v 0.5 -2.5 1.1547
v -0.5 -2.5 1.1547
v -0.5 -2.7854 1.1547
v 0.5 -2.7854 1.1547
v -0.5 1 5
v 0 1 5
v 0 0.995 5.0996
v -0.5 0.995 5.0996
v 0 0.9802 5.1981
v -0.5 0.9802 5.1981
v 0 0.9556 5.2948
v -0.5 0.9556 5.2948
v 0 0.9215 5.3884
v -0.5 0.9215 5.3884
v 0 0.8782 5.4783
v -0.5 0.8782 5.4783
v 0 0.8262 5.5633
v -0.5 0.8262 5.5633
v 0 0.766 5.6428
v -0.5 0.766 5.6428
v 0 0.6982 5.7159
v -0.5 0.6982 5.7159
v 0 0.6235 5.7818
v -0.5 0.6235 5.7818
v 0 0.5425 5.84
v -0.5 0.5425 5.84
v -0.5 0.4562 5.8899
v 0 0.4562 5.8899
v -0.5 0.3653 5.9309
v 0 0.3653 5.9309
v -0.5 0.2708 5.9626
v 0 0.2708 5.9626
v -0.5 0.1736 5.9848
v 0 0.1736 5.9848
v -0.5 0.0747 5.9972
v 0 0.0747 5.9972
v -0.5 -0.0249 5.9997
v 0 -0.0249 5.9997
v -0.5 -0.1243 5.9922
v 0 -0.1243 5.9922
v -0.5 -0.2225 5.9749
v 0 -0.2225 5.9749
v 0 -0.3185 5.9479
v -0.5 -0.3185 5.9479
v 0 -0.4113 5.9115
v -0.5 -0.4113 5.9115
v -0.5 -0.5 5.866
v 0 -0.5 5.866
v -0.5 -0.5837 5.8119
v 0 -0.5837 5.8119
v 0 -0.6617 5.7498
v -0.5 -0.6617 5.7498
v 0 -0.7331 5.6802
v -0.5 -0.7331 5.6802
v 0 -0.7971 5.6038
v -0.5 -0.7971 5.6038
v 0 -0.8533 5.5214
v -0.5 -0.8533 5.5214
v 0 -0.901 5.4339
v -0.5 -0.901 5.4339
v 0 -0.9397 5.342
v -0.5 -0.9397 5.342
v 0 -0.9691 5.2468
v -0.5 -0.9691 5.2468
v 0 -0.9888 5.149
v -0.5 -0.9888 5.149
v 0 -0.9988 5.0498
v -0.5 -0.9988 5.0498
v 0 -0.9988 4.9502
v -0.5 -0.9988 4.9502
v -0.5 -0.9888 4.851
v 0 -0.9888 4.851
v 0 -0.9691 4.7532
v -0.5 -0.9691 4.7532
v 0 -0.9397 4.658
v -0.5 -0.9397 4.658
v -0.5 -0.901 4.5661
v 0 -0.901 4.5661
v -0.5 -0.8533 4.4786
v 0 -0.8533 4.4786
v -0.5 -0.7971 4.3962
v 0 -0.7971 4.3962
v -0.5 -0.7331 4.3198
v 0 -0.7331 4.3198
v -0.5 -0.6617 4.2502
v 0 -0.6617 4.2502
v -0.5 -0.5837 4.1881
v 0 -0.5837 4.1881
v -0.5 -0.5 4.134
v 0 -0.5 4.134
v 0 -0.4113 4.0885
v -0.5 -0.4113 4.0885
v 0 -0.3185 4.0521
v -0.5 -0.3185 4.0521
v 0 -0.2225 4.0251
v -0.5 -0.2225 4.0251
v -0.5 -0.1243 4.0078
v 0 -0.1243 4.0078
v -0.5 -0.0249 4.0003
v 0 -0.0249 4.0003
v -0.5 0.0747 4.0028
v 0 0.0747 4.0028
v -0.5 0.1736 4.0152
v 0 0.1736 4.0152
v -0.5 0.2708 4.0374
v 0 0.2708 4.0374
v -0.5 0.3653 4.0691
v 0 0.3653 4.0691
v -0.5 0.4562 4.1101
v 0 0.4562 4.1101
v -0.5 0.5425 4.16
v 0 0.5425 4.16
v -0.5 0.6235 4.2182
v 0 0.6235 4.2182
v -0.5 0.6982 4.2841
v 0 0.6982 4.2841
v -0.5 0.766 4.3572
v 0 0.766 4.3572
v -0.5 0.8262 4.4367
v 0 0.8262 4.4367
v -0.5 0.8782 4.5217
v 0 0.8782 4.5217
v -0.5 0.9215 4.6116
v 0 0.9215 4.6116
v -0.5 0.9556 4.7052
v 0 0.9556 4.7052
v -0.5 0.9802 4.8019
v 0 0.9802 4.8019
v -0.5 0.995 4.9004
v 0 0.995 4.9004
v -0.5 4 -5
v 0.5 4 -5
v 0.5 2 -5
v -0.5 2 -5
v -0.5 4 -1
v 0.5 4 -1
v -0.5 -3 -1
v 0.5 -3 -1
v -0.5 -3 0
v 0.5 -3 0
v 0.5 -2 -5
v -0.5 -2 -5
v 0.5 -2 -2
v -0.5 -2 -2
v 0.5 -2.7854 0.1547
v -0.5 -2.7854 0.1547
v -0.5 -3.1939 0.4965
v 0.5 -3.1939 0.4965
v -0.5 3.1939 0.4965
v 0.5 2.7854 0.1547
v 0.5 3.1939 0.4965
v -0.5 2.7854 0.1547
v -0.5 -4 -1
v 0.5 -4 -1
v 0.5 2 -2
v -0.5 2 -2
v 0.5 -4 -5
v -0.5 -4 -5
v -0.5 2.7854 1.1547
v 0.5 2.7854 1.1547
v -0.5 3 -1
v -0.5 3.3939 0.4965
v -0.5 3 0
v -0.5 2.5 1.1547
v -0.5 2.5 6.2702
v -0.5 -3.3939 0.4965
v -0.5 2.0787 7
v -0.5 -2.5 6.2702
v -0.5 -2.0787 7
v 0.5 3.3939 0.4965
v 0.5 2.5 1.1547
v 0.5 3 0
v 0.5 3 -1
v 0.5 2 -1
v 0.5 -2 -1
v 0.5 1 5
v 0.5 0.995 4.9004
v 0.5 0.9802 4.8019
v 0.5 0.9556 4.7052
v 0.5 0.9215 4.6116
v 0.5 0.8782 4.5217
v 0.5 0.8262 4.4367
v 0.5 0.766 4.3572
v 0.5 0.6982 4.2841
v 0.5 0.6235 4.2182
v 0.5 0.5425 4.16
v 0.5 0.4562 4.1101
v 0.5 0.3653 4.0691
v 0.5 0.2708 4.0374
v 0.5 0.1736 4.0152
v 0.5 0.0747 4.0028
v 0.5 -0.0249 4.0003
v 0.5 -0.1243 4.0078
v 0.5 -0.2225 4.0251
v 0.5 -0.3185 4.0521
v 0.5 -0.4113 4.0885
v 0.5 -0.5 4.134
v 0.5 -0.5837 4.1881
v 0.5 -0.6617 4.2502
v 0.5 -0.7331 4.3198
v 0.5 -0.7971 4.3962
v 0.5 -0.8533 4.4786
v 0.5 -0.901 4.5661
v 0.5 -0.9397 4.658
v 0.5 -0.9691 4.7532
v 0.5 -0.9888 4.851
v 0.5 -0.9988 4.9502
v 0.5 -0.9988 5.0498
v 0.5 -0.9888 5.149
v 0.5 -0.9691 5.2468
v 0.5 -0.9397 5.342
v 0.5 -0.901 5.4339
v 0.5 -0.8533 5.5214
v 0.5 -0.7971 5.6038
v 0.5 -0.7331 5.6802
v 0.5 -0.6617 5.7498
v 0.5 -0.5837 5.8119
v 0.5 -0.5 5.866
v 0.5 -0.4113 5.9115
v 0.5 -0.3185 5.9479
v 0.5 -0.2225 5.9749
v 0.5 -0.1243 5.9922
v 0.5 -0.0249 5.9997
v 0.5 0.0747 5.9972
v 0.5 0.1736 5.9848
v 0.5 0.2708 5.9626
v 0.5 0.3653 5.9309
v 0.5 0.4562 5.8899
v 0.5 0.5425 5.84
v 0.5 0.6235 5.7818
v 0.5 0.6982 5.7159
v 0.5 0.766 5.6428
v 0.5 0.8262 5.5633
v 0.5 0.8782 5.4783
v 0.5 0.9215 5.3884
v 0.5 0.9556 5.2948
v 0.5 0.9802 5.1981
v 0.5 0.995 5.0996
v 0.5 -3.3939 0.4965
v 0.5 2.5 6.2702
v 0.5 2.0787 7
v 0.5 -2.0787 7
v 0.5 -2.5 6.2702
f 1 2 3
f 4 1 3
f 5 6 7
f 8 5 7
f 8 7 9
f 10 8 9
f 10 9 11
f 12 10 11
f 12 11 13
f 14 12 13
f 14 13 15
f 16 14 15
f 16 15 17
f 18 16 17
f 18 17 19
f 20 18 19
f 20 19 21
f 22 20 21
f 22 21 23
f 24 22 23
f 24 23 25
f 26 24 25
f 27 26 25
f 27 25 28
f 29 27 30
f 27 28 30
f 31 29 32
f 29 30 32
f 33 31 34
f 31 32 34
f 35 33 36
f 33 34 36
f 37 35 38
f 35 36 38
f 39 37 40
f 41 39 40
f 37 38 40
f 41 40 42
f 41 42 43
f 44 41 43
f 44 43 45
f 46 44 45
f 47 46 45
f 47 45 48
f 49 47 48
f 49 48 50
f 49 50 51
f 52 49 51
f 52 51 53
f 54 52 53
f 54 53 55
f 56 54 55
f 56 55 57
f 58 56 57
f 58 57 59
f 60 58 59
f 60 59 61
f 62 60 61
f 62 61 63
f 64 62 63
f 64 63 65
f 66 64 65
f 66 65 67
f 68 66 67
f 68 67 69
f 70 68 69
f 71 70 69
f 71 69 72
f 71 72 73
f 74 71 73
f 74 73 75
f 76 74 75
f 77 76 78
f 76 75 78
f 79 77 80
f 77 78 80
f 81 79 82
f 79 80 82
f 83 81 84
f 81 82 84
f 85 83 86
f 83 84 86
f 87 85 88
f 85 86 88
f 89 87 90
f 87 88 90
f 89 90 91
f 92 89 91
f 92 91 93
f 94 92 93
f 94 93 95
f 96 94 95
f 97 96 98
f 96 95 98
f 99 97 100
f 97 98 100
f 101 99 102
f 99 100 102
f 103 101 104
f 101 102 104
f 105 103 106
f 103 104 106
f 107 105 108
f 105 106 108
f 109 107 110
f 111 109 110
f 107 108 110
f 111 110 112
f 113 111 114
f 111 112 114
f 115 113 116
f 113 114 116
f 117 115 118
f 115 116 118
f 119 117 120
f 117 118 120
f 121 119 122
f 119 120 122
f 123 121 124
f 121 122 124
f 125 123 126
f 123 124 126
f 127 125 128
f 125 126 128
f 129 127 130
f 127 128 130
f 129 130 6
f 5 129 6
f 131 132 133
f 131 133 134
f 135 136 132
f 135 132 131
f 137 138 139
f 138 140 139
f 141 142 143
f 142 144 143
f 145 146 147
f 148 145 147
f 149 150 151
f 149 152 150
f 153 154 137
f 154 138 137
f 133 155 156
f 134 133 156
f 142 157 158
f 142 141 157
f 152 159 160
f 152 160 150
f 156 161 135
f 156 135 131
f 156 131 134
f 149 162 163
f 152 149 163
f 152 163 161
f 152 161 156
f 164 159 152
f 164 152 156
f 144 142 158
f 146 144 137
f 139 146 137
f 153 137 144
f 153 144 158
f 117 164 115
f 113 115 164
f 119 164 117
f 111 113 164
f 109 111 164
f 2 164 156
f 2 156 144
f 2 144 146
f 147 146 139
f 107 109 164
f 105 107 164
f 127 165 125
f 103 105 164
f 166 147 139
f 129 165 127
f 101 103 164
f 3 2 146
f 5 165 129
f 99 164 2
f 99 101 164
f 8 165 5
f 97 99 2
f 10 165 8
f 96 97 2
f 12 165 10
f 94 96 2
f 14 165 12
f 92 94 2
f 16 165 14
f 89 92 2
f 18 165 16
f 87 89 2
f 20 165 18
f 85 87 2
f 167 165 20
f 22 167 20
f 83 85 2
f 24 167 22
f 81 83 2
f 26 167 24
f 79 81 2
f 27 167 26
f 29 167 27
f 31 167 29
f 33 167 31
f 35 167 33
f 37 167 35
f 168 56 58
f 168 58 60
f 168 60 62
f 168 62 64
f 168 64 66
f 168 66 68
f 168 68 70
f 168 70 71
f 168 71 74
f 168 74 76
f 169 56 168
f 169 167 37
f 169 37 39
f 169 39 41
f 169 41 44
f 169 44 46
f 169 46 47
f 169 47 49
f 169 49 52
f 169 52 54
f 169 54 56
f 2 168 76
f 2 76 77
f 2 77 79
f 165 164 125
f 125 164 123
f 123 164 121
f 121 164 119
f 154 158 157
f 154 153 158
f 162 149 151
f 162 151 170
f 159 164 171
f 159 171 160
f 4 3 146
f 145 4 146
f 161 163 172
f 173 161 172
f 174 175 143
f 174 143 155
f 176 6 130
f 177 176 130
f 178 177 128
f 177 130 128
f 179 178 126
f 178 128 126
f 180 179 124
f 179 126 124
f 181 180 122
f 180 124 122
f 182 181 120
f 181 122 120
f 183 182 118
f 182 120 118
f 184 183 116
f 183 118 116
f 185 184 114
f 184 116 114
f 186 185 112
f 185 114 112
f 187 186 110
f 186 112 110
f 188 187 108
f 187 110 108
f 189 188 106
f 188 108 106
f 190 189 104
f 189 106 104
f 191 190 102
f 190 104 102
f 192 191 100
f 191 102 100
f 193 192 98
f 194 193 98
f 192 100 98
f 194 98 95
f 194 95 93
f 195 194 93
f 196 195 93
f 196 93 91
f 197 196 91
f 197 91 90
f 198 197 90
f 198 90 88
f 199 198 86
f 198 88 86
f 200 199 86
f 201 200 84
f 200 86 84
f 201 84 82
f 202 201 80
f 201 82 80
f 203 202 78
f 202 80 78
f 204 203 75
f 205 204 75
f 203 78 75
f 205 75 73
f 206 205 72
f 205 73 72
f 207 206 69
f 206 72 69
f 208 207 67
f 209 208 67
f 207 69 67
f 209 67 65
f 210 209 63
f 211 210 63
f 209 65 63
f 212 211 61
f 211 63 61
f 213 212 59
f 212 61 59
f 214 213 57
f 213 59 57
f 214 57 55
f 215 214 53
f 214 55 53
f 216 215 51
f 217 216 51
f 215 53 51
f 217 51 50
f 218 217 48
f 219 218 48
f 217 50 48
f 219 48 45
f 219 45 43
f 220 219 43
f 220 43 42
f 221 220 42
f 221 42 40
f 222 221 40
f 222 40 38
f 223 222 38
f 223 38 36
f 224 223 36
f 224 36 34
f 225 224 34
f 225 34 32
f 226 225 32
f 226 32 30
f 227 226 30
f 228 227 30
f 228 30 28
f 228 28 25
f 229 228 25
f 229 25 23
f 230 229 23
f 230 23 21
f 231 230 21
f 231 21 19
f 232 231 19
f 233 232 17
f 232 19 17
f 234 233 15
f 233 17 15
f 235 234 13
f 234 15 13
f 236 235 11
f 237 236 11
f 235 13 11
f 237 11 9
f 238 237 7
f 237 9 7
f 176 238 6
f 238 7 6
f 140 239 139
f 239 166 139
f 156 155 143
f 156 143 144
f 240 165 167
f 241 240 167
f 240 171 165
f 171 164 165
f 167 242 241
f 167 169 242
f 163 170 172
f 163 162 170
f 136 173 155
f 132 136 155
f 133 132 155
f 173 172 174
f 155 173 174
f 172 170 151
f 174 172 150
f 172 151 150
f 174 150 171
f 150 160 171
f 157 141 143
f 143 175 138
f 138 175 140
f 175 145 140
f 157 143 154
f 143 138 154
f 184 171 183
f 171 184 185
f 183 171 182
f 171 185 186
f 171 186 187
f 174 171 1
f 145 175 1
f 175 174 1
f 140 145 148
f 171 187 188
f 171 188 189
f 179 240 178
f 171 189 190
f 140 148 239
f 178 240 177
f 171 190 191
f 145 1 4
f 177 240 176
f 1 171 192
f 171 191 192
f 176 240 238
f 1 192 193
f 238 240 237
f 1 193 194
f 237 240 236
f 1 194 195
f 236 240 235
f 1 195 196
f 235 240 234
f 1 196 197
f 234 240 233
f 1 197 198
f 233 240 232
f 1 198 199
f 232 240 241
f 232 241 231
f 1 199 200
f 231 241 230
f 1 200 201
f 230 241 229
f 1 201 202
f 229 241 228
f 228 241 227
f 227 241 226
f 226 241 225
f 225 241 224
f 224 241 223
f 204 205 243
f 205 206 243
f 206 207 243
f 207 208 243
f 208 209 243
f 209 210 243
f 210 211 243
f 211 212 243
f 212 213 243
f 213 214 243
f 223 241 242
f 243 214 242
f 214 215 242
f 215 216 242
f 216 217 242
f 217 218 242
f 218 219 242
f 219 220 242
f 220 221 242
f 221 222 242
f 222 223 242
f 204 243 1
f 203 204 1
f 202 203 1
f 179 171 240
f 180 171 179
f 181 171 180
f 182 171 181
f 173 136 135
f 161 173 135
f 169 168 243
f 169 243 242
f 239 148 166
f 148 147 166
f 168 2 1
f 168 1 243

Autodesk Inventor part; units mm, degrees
ref_plane "YZ Plane" through (0, 0, 0) normal (1, 0, 0) x (0, 1, 0)
ref_plane "XZ Plane" through (0, 0, 0) normal (0, 1, 0) x (-1, 0, 0)
ref_plane "XY Plane" through (0, 0, 0) normal (0, 0, 1) x (1, 0, 0)
sketch "Boceto1" plane through (0, 0, 0) normal (0, 0, 1) x (1, 0, 0)
  line L0 (0.5, -3) -> (-0.5, -3)
  line L1 (-0.5, -3) -> (-0.5, 3)
  line L2 (-0.5, 3) -> (0.5, 3)
  line L3 (0.5, 3) -> (0.5, -3)
  line L4 (0.5, -3) -> (-0.5, 3) construction
  line L5 (-0.5, -3) -> (0.5, 3) construction
  point P0 (0, 0)
  dimension "d0" = 1
  dimension "d1" = 6
sketch "Boceto2" plane through (0, 0, 0) normal (1, 0, 0) x (0, 1, 0)
  line L0 (0, 0) -> (0, 7)
  line L1 (2.5, 1.1547) -> (2.5, 6.2702)
  line L2 (2.5, 6.2702) -> (2.0787, 7)
  line L3 (2.0787, 7) -> (0, 7)
  line L4 (2.5, 1.1547) -> (2.6776, 1.1547)
  line L5 (2.6776, 1.1547) -> (2.7854, 1.1547)
  line L6 (2.7854, 1.1547) -> (2.7854, 0.1547)
  line L7 (2.7854, 0.1547) -> (3.1939, 0.4965)
  line L8 (3.1939, 0.4965) -> (3.3939, 0.4965)
  line L9 (3.3939, 0.4965) -> (3, 0)
  line L10 (-2.5, 1.1547) -> (-2.5, 6.2702)
  line L11 (-2.5, 6.2702) -> (-2.0787, 7)
  line L12 (-2.0787, 7) -> (0, 7)
  line L13 (-2.5, 1.1547) -> (-2.6776, 1.1547)
  line L14 (-2.6776, 1.1547) -> (-2.7854, 1.1547)
  line L15 (-2.7854, 1.1547) -> (-2.7854, 0.1547)
  line L16 (-2.7854, 0.1547) -> (-3.1939, 0.4965)
  line L17 (-3.1939, 0.4965) -> (-3.3939, 0.4965)
  line L18 (-3.3939, 0.4965) -> (-3, 0)
  line L19 (3, 0) -> (-3, 0)
  circle A0 centre (0, 5) radius 1
  dimension "d2" = 7
  dimension "d3" = 120
  dimension "d8" = 0.2
  dimension "d9" = 1
  dimension "d10" = 2
  dimension "d11" = 2
extrude "Extrusión1" add sketch "Boceto2" along normal mid plane 1 contours L19 L18 L17 L16 L15 L14 L13 L10 L11 L12 L0 A0 | L0 A0 L3 L2 L1 L4 L5 L6 L7 L8 L9 L19
extrude "Extrusión2" add sketch "Boceto1" against normal blind 1
sketch "Boceto3" plane through (0, 0, -1) normal (0, 0, -1) x (-1, 0, 0)
  line L0 (-0.5, 4) -> (0.5, 4)
  line L1 (0.5, 4) -> (0.5, -4)
  line L2 (0.5, -4) -> (-0.5, -4)
  line L3 (-0.5, -4) -> (-0.5, 4)
  line L4 (-0.5, 4) -> (0.5, -4) construction
  line L5 (0.5, 4) -> (-0.5, -4) construction
  line L6 (-0.5, 2) -> (0.5, 2)
  line L7 (0.5, 2) -> (0.5, -2)
  line L8 (0.5, -2) -> (-0.5, -2)
  line L9 (-0.5, -2) -> (-0.5, 2)
  line L10 (-0.5, 2) -> (0.5, -2) construction
  line L11 (0.5, 2) -> (-0.5, -2) construction
  point P0 (0, 0)
  dimension "d16" = 8
  dimension "d17" = 4
extrude "Extrusión3" add sketch "Boceto3" along normal blind 4 contours L0 L1 L6 L3 | L8 L1 L2 L3
sketch "Boceto4" plane through (0, 0, -1) normal (0, 0, -1) x (-1, 0, 0)
  line L0 (-0.5, 2) -> (0.5, 2)
  line L1 (0.5, 2) -> (0.5, -2)
  line L2 (0.5, -2) -> (-0.5, -2)
  line L3 (-0.5, -2) -> (-0.5, 2)
  line L4 (-0.5, 2) -> (0.5, -2) construction
  line L5 (0.5, 2) -> (-0.5, -2) construction
  point P0 (0, 0)
  dimension "d20" = 1
  dimension "d21" = 4
extrude "Extrusión4" add sketch "Boceto4" along normal blind 1
properties part number "Polo2"
